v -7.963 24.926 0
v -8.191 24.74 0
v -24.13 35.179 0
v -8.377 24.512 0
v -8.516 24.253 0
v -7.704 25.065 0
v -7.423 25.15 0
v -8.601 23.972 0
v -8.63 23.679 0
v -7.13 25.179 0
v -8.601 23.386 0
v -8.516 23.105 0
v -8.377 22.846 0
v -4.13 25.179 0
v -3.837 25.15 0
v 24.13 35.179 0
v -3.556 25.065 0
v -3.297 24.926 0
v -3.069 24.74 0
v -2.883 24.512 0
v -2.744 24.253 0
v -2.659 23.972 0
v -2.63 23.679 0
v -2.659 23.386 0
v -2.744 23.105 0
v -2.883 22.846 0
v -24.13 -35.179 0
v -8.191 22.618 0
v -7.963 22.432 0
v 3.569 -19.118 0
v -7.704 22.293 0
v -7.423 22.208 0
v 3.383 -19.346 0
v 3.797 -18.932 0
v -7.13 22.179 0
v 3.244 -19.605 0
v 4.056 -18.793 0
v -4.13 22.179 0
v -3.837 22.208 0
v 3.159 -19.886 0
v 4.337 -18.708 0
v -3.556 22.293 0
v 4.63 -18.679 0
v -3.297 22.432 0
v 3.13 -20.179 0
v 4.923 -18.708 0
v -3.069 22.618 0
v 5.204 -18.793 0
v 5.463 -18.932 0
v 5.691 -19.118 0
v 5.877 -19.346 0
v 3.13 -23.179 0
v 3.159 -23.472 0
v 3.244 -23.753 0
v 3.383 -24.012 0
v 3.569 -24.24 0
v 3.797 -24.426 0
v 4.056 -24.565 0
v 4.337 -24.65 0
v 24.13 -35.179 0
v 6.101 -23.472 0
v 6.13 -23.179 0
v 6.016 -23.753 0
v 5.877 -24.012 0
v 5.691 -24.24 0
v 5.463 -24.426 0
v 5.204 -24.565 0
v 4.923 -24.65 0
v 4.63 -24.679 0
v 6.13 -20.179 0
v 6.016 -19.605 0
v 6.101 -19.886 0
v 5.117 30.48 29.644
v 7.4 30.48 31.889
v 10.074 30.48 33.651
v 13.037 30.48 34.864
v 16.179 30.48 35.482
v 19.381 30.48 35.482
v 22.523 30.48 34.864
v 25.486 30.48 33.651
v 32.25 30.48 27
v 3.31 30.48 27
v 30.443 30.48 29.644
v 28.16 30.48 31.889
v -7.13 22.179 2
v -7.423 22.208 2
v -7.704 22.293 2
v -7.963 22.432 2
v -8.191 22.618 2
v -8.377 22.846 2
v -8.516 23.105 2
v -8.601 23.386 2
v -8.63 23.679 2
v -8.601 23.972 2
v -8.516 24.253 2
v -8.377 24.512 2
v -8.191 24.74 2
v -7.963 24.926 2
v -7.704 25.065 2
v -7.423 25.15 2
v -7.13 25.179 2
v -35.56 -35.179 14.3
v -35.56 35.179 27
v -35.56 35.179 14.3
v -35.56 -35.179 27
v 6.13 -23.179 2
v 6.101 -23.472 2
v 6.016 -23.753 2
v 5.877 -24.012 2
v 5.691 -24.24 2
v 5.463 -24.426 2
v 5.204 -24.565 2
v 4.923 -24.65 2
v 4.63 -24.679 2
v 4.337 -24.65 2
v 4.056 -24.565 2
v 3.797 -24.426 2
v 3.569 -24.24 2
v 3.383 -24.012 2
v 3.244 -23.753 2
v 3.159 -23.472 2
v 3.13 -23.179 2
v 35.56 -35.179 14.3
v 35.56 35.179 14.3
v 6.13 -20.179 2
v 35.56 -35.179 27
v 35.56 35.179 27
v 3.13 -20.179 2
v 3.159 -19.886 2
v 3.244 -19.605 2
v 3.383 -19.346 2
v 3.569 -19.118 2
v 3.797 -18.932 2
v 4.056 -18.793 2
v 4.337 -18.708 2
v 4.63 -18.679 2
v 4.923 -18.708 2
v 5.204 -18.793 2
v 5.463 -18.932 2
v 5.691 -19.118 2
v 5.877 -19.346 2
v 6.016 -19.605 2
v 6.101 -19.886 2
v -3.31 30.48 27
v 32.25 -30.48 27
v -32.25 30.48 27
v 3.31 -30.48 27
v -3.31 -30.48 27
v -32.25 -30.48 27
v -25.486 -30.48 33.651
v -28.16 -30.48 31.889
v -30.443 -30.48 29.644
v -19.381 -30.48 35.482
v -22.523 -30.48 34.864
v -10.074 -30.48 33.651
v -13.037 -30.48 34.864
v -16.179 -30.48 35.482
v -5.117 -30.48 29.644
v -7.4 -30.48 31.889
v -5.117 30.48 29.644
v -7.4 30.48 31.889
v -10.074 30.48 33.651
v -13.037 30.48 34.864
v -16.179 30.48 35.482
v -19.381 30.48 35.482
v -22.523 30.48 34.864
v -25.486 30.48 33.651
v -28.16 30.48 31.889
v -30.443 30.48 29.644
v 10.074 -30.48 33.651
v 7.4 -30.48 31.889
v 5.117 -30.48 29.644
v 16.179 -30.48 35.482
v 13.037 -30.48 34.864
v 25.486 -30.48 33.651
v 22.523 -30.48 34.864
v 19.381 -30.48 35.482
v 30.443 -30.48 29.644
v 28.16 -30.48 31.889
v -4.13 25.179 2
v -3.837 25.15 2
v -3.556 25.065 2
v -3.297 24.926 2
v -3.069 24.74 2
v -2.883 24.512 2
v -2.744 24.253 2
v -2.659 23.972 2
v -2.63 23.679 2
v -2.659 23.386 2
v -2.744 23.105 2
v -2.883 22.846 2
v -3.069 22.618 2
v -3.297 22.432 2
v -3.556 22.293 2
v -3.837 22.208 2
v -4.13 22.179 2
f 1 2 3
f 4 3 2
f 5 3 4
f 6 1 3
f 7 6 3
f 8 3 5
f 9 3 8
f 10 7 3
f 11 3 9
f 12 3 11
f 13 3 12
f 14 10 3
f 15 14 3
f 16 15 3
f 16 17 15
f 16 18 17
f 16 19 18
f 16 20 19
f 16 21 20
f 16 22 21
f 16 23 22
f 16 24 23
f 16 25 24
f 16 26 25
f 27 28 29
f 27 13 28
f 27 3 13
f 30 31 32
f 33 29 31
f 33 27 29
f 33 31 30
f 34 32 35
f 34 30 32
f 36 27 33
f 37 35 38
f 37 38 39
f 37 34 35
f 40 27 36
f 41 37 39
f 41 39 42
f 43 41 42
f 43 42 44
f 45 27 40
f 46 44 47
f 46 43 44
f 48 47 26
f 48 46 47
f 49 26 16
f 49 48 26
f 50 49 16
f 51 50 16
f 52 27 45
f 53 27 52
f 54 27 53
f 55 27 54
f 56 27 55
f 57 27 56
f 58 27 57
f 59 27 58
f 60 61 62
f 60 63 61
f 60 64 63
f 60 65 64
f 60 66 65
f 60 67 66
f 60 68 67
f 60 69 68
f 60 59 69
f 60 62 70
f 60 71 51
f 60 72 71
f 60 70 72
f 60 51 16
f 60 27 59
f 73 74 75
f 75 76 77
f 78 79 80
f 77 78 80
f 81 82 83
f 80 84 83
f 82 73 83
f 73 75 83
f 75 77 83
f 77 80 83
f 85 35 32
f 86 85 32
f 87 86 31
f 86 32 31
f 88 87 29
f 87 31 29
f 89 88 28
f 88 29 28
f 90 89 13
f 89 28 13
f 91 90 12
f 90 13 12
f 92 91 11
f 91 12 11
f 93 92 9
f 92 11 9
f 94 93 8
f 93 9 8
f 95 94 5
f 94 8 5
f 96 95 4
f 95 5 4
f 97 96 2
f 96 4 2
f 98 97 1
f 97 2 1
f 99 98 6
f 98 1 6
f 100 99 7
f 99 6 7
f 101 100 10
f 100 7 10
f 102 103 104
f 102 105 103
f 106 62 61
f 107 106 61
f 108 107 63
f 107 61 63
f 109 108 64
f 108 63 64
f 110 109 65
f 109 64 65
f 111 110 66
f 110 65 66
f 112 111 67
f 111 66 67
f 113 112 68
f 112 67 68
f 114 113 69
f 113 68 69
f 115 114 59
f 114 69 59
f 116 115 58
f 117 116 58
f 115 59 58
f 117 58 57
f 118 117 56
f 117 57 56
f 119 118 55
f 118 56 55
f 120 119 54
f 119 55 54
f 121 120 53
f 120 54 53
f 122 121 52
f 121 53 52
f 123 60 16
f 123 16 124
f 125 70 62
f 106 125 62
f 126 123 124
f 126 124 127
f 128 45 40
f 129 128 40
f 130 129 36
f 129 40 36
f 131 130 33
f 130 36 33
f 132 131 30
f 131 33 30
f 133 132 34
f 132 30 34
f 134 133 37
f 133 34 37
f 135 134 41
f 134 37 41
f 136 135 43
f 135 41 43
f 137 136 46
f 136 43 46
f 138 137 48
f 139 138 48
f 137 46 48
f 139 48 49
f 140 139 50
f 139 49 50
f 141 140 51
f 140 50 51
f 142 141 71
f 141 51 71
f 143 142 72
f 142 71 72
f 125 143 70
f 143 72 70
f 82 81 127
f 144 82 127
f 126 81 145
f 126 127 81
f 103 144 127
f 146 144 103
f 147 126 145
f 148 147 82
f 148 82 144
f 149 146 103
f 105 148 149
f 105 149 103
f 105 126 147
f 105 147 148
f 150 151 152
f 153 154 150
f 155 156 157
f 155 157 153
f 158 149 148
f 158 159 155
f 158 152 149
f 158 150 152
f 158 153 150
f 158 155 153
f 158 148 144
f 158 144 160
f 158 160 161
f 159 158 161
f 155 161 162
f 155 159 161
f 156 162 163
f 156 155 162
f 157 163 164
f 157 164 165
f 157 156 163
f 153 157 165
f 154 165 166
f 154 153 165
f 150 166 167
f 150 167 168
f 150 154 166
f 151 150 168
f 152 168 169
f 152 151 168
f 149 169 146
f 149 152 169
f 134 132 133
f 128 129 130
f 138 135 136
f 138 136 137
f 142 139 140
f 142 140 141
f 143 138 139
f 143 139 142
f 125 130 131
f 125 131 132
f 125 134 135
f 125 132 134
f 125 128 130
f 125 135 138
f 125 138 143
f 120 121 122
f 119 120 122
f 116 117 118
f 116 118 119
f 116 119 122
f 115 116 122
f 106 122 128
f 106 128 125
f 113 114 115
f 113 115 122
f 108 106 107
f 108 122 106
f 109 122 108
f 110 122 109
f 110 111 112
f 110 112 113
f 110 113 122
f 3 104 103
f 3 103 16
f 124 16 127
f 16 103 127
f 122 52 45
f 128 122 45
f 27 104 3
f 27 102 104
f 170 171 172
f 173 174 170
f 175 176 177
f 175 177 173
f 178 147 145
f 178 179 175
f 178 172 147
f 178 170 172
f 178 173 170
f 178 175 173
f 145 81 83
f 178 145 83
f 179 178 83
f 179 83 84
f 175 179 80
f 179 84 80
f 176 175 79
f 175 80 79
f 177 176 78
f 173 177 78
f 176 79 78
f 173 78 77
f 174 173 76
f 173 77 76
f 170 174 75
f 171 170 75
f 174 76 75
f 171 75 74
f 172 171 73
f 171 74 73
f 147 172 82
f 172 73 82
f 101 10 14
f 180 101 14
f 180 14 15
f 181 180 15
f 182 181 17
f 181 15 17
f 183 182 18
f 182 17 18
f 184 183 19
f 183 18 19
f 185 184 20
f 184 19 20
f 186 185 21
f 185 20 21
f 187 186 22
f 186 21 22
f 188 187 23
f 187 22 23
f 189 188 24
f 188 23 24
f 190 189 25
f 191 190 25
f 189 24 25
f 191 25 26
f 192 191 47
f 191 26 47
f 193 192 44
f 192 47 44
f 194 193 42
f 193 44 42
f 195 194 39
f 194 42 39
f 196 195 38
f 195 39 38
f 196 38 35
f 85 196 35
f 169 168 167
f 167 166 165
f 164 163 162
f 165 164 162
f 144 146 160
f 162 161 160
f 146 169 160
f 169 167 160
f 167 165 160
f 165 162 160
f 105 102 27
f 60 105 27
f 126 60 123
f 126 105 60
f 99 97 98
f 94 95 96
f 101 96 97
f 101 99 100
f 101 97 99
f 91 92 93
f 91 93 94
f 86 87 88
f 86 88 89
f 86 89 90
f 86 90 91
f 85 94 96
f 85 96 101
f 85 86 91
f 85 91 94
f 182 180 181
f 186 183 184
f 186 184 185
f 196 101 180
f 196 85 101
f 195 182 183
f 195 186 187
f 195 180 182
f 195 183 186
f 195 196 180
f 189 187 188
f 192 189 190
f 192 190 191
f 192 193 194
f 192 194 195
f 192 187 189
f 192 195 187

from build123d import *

# Parameters (mm, degrees)
F2_DEPTH = 35.179
F1_R     = 16.51
F3_DEPTH = 30.48
F5_DEPTH = 2


with BuildPart() as f2:
    # F0 (on Front) → F2 (new body, symmetric)
    with BuildSketch(Plane.XZ):
        Polygon((-35.56, 14.3), (-24.13, 0), (24.13, 0), (35.56, 14.3), (35.56, 27), (-35.56, 27), align=None)
    extrude(amount=F2_DEPTH, both=True)

    # F1 (on Front) → F3 (join, symmetric)
    with BuildSketch(Plane.XZ):
        with Locations((17.78, 19.05)):
            Circle(F1_R)
        with Locations((-17.78, 19.05)):
            Circle(F1_R)
    extrude(amount=F3_DEPTH, both=True)

    # F4 (on face) → F5 (cut)
    with BuildSketch(Plane(origin=(0, 0, 0), x_dir=(1, 0, 0), z_dir=(0, 0, -1))):
        with BuildLine():
            ThreePointArc((6.13, 23.179), (4.63, 24.679), (3.13, 23.179))
            Line((3.13, 23.179), (3.13, 20.179))
            ThreePointArc((3.13, 20.179), (4.63, 18.679), (6.13, 20.179))
            Line((6.13, 20.179), (6.13, 23.179))
        make_face()
        with BuildLine():
            ThreePointArc((-7.13, -22.179), (-8.63, -23.679), (-7.13, -25.179))
            Line((-7.13, -25.179), (-4.13, -25.179))
            ThreePointArc((-4.13, -25.179), (-2.63, -23.679), (-4.13, -22.179))
            Line((-4.13, -22.179), (-7.13, -22.179))
        make_face()
    extrude(amount=-F5_DEPTH, mode=Mode.SUBTRACT)


solid = f2.part
